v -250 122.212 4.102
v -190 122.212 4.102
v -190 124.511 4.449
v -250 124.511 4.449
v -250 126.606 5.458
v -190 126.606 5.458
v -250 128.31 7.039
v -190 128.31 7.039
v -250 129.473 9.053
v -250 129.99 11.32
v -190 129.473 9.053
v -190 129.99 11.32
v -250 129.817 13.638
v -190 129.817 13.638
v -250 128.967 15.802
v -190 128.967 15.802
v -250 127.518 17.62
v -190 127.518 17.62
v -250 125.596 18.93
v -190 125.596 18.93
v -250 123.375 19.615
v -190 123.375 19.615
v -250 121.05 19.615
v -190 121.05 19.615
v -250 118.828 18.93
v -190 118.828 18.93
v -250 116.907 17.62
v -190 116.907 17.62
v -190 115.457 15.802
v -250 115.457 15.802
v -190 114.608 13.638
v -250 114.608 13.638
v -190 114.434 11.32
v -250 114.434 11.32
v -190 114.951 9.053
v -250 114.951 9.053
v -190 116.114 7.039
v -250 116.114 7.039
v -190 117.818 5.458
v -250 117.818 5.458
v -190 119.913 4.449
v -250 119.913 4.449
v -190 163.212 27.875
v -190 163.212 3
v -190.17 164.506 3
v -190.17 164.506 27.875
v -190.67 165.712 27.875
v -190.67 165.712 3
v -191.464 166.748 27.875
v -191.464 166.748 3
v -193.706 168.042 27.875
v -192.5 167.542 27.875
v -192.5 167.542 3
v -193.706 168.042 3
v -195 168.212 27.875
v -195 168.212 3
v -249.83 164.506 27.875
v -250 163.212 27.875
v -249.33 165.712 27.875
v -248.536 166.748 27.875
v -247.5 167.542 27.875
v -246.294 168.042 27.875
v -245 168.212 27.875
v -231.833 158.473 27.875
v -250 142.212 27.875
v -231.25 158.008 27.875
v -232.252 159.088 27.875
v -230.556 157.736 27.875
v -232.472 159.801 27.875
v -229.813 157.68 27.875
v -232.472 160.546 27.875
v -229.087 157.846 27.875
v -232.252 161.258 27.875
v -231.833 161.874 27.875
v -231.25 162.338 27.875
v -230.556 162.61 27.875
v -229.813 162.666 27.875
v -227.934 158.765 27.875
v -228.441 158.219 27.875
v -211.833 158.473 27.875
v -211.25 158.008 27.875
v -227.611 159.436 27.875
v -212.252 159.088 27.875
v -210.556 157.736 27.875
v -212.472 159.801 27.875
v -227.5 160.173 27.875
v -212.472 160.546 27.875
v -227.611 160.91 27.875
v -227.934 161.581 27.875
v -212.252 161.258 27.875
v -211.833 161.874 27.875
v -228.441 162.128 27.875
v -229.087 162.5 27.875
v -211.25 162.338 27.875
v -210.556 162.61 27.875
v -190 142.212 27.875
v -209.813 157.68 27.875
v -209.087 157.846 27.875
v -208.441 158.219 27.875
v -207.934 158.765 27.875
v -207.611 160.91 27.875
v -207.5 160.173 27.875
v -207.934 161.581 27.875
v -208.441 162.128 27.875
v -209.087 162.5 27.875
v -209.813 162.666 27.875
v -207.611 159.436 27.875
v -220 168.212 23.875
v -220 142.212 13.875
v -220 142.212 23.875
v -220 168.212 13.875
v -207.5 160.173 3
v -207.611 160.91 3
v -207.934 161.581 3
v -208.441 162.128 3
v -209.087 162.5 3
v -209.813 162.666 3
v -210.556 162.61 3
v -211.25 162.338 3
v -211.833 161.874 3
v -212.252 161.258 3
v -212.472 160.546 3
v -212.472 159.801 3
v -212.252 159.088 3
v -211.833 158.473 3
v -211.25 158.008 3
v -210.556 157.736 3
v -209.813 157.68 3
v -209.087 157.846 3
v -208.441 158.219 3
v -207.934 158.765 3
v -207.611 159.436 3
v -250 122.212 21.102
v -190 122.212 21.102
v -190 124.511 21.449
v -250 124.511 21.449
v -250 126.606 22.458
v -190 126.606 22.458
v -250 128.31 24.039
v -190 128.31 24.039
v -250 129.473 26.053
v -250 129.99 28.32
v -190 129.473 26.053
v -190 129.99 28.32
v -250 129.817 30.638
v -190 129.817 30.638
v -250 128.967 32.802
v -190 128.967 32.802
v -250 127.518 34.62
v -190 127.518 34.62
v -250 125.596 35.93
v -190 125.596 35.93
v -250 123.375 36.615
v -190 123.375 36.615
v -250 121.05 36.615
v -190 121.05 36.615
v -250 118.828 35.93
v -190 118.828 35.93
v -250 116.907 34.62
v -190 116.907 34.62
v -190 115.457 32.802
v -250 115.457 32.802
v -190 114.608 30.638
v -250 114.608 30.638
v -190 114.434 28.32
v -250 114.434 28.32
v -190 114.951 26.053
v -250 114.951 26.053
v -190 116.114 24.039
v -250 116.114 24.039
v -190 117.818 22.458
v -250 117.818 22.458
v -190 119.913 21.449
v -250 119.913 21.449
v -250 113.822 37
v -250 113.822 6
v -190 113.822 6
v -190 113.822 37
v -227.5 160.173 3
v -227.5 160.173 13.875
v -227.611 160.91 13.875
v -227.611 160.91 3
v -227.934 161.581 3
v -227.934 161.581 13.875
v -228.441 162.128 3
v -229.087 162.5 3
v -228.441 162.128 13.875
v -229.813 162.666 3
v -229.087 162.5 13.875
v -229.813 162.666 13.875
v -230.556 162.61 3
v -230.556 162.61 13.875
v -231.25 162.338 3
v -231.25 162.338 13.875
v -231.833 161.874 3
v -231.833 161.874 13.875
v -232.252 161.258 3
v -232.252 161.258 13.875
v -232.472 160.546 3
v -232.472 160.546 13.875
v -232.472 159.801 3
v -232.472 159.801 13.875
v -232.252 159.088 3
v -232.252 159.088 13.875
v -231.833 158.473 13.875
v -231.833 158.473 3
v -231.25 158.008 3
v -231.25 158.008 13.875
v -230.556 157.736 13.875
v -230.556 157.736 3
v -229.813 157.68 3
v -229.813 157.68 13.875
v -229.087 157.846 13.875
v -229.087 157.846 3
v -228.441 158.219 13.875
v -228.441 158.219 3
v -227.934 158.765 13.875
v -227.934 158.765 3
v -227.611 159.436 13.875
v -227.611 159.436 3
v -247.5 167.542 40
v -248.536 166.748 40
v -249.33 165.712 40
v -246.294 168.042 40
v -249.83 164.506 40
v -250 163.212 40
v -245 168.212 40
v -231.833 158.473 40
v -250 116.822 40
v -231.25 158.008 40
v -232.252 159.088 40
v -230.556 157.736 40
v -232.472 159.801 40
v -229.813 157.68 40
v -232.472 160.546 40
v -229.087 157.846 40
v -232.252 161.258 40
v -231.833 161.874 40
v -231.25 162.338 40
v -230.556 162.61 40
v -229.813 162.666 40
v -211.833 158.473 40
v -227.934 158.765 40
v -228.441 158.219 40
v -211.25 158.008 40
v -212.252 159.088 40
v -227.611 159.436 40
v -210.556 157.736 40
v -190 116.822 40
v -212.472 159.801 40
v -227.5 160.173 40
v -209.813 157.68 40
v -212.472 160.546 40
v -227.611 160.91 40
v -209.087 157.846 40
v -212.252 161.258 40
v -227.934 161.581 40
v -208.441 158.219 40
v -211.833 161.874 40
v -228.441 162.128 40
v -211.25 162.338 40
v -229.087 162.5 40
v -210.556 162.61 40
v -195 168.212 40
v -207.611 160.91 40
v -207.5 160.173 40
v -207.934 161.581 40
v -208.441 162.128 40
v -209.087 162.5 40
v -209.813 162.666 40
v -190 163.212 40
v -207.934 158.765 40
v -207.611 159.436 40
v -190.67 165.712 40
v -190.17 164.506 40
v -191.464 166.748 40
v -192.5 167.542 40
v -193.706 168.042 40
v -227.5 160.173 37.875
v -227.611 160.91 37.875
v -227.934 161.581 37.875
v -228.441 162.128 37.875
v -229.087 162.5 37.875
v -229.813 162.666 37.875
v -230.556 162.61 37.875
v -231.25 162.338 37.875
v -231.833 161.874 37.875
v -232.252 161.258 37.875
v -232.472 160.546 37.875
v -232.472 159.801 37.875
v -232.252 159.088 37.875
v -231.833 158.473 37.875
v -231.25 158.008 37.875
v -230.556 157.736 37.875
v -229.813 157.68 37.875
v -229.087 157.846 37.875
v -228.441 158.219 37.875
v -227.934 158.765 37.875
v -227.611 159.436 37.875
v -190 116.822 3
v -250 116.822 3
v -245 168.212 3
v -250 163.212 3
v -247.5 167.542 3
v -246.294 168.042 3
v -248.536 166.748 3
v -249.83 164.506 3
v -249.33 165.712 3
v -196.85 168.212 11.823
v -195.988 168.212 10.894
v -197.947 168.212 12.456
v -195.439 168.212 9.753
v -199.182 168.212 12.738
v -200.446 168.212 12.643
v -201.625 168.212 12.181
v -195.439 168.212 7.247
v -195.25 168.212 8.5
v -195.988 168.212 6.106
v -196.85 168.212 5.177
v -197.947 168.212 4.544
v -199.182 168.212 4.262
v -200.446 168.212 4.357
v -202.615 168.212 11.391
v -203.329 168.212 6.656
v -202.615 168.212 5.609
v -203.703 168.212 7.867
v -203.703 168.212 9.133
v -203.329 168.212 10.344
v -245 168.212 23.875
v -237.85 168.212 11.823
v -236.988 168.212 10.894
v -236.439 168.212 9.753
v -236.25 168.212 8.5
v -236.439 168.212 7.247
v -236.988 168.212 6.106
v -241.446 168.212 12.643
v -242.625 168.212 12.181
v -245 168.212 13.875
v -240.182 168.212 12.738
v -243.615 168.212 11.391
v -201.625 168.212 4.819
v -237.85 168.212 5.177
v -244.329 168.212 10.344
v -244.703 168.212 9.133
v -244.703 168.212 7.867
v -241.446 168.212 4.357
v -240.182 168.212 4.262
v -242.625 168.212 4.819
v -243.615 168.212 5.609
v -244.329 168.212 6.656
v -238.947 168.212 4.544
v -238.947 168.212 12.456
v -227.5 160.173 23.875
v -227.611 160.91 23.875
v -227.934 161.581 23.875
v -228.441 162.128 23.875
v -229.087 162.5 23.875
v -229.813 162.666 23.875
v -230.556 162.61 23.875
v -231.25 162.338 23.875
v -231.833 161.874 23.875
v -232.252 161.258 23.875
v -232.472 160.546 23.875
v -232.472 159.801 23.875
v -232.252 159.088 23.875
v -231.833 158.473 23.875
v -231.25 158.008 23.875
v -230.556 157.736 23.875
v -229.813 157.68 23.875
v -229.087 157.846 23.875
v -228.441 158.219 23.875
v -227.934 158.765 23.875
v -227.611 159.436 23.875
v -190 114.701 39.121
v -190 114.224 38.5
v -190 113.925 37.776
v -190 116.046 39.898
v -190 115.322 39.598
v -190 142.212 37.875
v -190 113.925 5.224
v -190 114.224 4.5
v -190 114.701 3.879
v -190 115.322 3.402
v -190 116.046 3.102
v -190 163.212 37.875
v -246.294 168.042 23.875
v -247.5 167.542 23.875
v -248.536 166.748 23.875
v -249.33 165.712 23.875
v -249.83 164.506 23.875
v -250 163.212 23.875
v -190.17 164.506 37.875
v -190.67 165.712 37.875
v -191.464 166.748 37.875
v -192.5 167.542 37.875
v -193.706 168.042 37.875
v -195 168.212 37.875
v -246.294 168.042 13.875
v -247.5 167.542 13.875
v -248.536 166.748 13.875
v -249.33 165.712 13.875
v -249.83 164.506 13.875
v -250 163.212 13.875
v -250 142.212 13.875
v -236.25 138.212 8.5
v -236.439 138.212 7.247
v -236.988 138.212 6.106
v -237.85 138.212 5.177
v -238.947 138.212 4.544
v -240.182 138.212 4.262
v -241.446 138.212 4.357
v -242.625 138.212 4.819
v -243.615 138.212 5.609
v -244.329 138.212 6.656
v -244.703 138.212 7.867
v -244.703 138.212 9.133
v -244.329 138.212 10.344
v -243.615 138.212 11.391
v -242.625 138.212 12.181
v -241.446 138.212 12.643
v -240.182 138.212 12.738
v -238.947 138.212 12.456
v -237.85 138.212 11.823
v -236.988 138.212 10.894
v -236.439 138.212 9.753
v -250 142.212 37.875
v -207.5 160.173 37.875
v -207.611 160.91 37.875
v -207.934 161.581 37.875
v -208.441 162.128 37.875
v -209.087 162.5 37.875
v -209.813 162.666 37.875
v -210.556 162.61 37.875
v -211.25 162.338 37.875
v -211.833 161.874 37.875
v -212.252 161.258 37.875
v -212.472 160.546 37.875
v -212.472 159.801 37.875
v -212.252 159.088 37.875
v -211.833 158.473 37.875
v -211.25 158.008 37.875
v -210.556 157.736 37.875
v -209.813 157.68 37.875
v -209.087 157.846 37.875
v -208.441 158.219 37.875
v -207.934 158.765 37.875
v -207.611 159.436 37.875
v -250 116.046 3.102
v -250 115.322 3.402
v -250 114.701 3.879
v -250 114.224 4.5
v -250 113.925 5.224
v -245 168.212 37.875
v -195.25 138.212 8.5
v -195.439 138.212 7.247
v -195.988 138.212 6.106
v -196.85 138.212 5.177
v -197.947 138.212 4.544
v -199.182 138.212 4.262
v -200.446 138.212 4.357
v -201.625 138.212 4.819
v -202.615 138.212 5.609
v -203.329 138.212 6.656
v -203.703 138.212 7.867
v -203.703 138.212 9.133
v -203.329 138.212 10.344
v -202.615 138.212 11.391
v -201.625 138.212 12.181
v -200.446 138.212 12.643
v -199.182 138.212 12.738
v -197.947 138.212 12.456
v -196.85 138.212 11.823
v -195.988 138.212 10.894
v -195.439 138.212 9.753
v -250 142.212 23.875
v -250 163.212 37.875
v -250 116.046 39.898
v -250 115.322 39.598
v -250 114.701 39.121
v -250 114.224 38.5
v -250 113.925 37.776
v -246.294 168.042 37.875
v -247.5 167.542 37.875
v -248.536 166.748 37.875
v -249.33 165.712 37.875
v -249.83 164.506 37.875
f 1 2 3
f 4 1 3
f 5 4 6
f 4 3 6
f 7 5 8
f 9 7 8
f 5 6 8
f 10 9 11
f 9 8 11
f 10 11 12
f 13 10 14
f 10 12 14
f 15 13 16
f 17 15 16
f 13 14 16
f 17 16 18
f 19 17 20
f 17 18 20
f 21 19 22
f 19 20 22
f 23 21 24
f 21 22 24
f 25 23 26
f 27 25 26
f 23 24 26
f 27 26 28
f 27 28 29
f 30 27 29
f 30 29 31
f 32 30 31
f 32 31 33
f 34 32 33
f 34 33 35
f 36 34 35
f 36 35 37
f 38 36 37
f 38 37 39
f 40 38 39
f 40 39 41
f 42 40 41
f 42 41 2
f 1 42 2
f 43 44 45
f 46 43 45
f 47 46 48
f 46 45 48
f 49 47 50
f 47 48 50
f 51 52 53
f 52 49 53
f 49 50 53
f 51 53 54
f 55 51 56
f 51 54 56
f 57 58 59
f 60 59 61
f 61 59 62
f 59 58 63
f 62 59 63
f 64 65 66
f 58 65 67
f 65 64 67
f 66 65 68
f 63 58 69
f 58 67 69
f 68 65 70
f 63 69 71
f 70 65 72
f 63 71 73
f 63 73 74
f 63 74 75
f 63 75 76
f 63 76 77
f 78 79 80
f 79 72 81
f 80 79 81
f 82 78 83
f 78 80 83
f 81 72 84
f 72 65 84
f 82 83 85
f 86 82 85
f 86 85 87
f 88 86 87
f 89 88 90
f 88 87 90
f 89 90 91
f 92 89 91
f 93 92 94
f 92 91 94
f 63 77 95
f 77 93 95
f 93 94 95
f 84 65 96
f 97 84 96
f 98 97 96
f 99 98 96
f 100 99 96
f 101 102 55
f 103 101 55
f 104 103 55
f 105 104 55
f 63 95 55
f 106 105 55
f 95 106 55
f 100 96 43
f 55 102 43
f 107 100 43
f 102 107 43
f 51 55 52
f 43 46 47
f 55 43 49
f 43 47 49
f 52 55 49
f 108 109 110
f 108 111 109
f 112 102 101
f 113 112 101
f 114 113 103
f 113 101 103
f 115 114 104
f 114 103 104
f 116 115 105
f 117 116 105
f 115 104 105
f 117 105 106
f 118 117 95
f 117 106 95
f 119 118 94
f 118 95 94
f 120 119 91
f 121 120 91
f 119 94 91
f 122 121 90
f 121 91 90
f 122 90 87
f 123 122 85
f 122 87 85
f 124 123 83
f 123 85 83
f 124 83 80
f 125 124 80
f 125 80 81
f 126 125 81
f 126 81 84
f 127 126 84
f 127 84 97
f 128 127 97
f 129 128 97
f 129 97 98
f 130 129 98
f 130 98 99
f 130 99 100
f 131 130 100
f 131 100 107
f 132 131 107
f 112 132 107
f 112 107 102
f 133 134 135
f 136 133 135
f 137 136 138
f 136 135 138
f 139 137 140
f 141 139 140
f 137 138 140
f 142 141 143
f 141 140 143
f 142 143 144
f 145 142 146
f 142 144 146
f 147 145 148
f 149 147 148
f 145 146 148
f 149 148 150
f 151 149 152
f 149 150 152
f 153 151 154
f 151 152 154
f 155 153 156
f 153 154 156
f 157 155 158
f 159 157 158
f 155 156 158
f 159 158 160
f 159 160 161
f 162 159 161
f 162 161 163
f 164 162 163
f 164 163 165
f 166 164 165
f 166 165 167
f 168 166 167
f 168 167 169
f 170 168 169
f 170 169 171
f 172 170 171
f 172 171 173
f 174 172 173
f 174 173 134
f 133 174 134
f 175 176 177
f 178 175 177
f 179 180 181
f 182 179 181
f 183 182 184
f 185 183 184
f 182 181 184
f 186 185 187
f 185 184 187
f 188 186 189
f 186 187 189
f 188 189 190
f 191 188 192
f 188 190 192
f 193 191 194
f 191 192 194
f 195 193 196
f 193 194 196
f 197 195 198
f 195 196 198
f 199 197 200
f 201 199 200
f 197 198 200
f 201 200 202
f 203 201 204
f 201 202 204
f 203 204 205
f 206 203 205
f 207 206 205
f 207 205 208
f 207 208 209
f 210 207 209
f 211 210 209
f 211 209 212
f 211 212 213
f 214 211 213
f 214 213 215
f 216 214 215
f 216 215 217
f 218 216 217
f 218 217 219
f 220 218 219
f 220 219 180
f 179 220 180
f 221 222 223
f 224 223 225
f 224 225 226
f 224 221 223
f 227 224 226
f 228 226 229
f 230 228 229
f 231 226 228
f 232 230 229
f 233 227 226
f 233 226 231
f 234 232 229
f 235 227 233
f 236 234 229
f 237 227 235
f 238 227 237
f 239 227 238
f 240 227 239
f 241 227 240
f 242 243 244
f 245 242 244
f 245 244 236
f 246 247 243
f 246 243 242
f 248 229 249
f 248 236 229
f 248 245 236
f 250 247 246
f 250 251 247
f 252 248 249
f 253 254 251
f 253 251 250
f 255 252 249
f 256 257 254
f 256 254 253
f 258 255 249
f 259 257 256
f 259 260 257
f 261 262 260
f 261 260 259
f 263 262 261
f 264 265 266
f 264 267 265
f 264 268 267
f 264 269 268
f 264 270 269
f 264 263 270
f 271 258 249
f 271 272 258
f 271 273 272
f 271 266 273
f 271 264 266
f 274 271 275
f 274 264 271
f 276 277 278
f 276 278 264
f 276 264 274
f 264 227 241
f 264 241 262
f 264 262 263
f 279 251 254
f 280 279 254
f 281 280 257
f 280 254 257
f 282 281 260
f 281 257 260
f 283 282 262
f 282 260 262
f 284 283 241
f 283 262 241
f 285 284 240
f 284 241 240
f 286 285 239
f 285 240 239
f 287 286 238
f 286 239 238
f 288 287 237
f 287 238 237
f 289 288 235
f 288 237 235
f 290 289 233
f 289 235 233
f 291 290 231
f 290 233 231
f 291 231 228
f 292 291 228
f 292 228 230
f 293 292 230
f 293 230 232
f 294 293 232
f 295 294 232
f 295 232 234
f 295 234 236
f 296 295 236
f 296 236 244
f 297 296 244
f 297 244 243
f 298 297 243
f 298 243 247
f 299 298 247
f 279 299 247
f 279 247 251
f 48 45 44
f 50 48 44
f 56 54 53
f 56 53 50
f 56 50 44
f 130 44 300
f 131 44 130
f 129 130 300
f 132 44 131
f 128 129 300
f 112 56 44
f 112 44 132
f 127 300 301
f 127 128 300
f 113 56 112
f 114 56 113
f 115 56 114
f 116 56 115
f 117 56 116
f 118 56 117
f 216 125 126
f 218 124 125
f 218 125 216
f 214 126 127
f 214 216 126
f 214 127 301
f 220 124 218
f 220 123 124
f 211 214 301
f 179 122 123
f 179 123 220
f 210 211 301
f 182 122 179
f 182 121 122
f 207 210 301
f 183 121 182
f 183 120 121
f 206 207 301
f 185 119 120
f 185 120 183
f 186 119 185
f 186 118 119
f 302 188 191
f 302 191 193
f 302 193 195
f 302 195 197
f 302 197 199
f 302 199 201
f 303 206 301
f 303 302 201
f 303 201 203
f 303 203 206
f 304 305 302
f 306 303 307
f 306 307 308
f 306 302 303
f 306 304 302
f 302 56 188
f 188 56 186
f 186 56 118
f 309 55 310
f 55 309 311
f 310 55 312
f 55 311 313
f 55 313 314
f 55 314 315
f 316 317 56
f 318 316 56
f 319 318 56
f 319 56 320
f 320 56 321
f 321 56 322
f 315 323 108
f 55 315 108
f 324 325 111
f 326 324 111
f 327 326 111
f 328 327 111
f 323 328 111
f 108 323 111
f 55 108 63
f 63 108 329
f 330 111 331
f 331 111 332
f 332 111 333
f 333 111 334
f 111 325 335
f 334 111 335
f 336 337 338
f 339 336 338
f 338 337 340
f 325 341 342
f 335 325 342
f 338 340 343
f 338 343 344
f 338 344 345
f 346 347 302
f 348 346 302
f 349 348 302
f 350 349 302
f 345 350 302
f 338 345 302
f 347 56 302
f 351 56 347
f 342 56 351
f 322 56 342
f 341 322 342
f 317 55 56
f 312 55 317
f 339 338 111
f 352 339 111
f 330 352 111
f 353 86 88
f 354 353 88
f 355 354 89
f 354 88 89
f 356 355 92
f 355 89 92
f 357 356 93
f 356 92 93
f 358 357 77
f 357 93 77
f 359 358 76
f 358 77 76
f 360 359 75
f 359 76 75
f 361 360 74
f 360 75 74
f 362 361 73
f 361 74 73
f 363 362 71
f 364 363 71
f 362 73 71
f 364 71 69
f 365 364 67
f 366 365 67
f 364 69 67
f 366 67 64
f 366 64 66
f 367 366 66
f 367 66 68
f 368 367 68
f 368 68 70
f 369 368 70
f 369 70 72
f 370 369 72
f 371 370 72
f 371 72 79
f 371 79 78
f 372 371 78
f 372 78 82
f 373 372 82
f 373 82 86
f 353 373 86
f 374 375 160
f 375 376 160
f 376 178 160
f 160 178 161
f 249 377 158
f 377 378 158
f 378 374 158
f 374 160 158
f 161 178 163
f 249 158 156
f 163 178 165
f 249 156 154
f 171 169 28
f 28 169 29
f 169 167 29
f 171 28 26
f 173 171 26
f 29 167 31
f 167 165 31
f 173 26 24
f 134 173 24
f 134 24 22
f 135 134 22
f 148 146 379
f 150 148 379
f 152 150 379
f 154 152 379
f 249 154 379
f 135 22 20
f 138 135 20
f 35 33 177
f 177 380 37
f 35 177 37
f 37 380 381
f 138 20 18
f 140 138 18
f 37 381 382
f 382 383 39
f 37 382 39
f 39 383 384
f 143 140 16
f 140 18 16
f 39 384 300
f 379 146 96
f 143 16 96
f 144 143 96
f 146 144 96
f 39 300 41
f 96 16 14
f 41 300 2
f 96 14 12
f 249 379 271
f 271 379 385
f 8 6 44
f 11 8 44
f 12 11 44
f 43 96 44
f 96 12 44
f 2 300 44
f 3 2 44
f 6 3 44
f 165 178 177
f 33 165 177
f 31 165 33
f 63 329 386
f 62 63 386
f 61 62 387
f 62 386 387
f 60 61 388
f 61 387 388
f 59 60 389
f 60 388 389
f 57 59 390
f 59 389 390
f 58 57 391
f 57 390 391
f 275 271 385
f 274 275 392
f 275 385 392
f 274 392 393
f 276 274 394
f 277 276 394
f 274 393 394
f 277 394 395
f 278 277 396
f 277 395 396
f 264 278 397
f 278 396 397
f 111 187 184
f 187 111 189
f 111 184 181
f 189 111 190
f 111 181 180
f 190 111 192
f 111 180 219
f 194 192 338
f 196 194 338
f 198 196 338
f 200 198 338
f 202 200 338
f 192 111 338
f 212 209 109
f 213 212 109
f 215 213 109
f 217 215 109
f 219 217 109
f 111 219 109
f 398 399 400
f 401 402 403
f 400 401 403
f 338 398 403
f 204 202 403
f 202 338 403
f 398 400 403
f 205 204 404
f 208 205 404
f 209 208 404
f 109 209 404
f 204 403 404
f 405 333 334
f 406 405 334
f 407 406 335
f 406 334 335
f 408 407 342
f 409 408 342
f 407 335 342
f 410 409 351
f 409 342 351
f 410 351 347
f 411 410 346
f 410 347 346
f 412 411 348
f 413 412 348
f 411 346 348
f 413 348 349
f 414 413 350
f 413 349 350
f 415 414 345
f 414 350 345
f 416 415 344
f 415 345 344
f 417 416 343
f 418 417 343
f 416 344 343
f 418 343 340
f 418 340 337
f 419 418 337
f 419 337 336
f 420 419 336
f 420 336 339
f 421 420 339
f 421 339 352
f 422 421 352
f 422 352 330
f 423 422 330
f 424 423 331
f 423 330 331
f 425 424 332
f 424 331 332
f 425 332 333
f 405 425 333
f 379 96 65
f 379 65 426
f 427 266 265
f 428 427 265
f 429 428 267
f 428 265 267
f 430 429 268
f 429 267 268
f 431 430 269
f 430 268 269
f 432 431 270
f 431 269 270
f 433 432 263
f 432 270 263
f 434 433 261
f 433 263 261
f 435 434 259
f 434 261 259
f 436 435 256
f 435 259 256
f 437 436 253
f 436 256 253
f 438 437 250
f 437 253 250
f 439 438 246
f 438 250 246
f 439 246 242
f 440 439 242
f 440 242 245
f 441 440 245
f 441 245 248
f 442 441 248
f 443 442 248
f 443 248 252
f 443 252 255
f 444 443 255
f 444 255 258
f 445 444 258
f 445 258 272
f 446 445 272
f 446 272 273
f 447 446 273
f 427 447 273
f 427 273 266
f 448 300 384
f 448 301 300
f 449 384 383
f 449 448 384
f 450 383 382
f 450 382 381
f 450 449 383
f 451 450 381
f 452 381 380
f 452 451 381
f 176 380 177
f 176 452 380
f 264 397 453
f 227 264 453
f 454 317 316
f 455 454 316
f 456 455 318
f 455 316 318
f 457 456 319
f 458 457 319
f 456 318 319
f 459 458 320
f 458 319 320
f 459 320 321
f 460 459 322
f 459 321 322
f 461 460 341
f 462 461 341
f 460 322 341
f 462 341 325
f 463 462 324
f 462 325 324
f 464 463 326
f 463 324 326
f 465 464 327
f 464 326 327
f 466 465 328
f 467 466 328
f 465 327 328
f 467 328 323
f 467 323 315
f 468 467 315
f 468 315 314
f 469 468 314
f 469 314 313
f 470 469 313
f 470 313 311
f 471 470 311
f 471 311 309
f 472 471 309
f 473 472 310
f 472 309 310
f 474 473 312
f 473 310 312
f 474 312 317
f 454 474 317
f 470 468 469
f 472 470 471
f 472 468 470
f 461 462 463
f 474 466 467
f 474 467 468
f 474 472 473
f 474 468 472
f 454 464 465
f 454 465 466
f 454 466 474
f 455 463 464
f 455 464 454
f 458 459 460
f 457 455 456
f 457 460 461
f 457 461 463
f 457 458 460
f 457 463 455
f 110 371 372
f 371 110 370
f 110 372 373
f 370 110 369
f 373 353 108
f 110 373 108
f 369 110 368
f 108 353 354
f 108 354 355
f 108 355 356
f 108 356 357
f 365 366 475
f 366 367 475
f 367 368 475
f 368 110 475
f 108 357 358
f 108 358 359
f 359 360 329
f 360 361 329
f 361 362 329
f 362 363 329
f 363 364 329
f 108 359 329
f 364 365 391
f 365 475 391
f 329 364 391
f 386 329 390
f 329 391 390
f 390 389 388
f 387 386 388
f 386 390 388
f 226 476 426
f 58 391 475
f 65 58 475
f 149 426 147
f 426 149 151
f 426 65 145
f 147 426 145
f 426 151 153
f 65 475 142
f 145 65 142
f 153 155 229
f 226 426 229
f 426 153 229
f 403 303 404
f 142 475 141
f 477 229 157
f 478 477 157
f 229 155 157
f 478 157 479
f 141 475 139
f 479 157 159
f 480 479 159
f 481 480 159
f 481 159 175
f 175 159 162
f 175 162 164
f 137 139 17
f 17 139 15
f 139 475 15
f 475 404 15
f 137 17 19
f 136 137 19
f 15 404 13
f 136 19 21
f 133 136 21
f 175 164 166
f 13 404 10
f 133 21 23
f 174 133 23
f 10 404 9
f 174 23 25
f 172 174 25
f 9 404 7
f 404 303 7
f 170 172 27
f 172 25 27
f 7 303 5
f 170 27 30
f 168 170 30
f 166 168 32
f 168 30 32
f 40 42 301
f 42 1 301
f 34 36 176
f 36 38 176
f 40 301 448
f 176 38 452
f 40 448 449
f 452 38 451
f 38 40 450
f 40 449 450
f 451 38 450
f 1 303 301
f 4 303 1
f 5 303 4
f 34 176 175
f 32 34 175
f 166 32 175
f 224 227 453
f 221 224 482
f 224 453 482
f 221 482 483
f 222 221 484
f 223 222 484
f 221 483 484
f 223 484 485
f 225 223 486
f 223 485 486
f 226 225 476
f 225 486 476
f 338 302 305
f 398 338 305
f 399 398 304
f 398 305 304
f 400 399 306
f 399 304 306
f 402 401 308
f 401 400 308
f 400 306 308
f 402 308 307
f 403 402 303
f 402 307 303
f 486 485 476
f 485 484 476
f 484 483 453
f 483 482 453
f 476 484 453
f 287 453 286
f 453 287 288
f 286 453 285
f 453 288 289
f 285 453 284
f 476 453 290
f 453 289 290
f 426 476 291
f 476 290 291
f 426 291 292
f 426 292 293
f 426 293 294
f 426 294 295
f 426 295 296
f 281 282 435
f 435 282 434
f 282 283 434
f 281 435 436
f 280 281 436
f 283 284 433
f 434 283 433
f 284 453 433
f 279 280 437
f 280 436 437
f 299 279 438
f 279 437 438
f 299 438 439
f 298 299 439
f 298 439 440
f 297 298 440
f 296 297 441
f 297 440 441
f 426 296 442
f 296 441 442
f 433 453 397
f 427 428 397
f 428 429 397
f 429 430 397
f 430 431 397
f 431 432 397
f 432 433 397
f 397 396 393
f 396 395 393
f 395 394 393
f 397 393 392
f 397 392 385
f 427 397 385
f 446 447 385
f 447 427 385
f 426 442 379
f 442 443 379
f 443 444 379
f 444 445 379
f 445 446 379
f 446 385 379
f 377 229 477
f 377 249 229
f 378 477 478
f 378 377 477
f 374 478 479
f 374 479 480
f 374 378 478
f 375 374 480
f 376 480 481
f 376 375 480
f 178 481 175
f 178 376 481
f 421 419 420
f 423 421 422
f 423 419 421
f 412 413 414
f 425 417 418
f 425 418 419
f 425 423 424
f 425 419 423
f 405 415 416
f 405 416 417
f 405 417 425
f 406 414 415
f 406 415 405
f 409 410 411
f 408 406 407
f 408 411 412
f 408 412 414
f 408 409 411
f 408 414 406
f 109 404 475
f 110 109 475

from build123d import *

# Parameters (mm, degrees)
RESSALTO_EXTRUS_O1_DEPTH = 40
ESBO_O4_R                = 7.8
CORTE_EXTRUS_O1_DEPTH    = 61
CORTE_EXTRUS_O2_DEPTH    = 3
FILETE2_R                = 3
CORTE_EXTRUS_O4_DEPTH    = 61
CORTE_EXTRUS_O5_DEPTH    = 30
ESBO_O10_R               = 2.5
CORTE_EXTRUS_O6_DEPTH    = 38
ESBO_O11_R               = 4.25
CORTE_EXTRUS_O7_DEPTH    = 30


with BuildPart() as part:
    # Esboço2 → Ressalto-extrusão1 (new body)
    with BuildSketch(Plane.XY):
        with BuildLine():
            Line((-246.218768802, 113.822486613), (-237.781231198, 113.822486613))
            Line((-237.781231198, 113.822486613), (-201.966801004, 113.822486613))
            Line((-201.966801004, 113.822486613), (-194.033198996, 113.822486613))
            Line((-194.033198996, 113.822486613), (-190, 113.822486613))
            Line((-190, 113.822486613), (-190, 138.123568891))
            Line((-190, 138.123568891), (-190, 163.212189341))
            ThreePointArc((-190, 163.212189341), (-191.464466094, 166.747723246), (-195, 168.212189341))
            Line((-195, 168.212189341), (-245, 168.212189341))
            ThreePointArc((-245, 168.212189341), (-248.535533906, 166.747723246), (-250, 163.212189341))
            Line((-250, 163.212189341), (-250, 138.123568891))
            Line((-250, 138.123568891), (-250, 113.822486613))
            Line((-250, 113.822486613), (-246.218768802, 113.822486613))
        make_face()
    extrude(amount=RESSALTO_EXTRUS_O1_DEPTH)

    # Esboço4 → Corte-extrusão1 (cut, through all)
    with BuildSketch(Plane(origin=(-190, 0, 0), x_dir=(0, 0, -1), z_dir=(1, 0, 0))):
        with Locations((-11.90241208, 122.212171493)):
            Circle(ESBO_O4_R)
        with Locations((-28.90241208, 122.212171493)):
            Circle(ESBO_O4_R)
    extrude(amount=-CORTE_EXTRUS_O1_DEPTH, mode=Mode.SUBTRACT)

    # Esboço5 → Corte-extrusão2 (cut)
    with BuildSketch(Plane(origin=(0, 0, 0), x_dir=(-1, 0, 0), z_dir=(0, 0, -1))):
        with BuildLine():
            Line((190, 163.212189341), (190, 113.822486613))
            Line((190, 113.822486613), (250, 113.822486613))
            Line((250, 113.822486613), (250, 163.212189341))
            ThreePointArc((250, 163.212189341), (248.535533906, 166.747723246), (245, 168.212189341))
            Line((245, 168.212189341), (195, 168.212189341))
            ThreePointArc((195, 168.212189341), (191.464466094, 166.747723246), (190, 163.212189341))
        make_face()
    extrude(amount=-CORTE_EXTRUS_O2_DEPTH, mode=Mode.SUBTRACT)

    # Filete2
    filete2_edges = [part.edges().sort_by_distance(p)[0] for p in [
        (-220, 113.822486613, 40),
        (-220, 113.822486613, 3),
    ]]
    fillet(filete2_edges, radius=FILETE2_R)

    # Esboço7 → Corte-extrusão4 (cut, through all)
    with BuildSketch(Plane(origin=(-190, 0, 0), x_dir=(0, 0, -1), z_dir=(1, 0, 0))):
        Polygon((-37.874860756, 142.212171493), (-37.874860756, 152.212171493), (-37.874860756, 170.639409053), (-27.874860756, 170.639409053), (-27.874860756, 152.212171493), (-27.874860756, 142.212171493), align=None)
    extrude(amount=-CORTE_EXTRUS_O4_DEPTH, mode=Mode.SUBTRACT)

    # Esboço8 → Corte-extrusão5 (cut)
    with BuildSketch(Plane.ZY.offset(250)):
        Polygon((23.874860756, 142.212171493), (23.874860756, 152.212171493), (23.874860756, 182.191519565), (13.874860756, 182.191519565), (13.874860756, 152.212171493), (13.874860756, 142.212171493), align=None)
    extrude(amount=-CORTE_EXTRUS_O5_DEPTH, mode=Mode.SUBTRACT)

    # Esboço10 → Corte-extrusão6 (cut, through all)
    with BuildSketch(Plane.XY.offset(40)):
        with Locations((-210, 160.173107934)):
            Circle(ESBO_O10_R)
        with Locations((-230, 160.173107934)):
            Circle(ESBO_O10_R)
    extrude(amount=-CORTE_EXTRUS_O6_DEPTH, mode=Mode.SUBTRACT)

    # Esboço11 → Corte-extrusão7 (cut)
    with BuildSketch(Plane(origin=(0, 168.212189341, 0), x_dir=(1, 0, 0), z_dir=(0, 1, 0))):
        with Locations((-199.5, -8.5)):
            Circle(ESBO_O11_R)
        with Locations((-240.5, -8.5)):
            Circle(ESBO_O11_R)
    extrude(amount=-CORTE_EXTRUS_O7_DEPTH, mode=Mode.SUBTRACT)


solid = part.part
